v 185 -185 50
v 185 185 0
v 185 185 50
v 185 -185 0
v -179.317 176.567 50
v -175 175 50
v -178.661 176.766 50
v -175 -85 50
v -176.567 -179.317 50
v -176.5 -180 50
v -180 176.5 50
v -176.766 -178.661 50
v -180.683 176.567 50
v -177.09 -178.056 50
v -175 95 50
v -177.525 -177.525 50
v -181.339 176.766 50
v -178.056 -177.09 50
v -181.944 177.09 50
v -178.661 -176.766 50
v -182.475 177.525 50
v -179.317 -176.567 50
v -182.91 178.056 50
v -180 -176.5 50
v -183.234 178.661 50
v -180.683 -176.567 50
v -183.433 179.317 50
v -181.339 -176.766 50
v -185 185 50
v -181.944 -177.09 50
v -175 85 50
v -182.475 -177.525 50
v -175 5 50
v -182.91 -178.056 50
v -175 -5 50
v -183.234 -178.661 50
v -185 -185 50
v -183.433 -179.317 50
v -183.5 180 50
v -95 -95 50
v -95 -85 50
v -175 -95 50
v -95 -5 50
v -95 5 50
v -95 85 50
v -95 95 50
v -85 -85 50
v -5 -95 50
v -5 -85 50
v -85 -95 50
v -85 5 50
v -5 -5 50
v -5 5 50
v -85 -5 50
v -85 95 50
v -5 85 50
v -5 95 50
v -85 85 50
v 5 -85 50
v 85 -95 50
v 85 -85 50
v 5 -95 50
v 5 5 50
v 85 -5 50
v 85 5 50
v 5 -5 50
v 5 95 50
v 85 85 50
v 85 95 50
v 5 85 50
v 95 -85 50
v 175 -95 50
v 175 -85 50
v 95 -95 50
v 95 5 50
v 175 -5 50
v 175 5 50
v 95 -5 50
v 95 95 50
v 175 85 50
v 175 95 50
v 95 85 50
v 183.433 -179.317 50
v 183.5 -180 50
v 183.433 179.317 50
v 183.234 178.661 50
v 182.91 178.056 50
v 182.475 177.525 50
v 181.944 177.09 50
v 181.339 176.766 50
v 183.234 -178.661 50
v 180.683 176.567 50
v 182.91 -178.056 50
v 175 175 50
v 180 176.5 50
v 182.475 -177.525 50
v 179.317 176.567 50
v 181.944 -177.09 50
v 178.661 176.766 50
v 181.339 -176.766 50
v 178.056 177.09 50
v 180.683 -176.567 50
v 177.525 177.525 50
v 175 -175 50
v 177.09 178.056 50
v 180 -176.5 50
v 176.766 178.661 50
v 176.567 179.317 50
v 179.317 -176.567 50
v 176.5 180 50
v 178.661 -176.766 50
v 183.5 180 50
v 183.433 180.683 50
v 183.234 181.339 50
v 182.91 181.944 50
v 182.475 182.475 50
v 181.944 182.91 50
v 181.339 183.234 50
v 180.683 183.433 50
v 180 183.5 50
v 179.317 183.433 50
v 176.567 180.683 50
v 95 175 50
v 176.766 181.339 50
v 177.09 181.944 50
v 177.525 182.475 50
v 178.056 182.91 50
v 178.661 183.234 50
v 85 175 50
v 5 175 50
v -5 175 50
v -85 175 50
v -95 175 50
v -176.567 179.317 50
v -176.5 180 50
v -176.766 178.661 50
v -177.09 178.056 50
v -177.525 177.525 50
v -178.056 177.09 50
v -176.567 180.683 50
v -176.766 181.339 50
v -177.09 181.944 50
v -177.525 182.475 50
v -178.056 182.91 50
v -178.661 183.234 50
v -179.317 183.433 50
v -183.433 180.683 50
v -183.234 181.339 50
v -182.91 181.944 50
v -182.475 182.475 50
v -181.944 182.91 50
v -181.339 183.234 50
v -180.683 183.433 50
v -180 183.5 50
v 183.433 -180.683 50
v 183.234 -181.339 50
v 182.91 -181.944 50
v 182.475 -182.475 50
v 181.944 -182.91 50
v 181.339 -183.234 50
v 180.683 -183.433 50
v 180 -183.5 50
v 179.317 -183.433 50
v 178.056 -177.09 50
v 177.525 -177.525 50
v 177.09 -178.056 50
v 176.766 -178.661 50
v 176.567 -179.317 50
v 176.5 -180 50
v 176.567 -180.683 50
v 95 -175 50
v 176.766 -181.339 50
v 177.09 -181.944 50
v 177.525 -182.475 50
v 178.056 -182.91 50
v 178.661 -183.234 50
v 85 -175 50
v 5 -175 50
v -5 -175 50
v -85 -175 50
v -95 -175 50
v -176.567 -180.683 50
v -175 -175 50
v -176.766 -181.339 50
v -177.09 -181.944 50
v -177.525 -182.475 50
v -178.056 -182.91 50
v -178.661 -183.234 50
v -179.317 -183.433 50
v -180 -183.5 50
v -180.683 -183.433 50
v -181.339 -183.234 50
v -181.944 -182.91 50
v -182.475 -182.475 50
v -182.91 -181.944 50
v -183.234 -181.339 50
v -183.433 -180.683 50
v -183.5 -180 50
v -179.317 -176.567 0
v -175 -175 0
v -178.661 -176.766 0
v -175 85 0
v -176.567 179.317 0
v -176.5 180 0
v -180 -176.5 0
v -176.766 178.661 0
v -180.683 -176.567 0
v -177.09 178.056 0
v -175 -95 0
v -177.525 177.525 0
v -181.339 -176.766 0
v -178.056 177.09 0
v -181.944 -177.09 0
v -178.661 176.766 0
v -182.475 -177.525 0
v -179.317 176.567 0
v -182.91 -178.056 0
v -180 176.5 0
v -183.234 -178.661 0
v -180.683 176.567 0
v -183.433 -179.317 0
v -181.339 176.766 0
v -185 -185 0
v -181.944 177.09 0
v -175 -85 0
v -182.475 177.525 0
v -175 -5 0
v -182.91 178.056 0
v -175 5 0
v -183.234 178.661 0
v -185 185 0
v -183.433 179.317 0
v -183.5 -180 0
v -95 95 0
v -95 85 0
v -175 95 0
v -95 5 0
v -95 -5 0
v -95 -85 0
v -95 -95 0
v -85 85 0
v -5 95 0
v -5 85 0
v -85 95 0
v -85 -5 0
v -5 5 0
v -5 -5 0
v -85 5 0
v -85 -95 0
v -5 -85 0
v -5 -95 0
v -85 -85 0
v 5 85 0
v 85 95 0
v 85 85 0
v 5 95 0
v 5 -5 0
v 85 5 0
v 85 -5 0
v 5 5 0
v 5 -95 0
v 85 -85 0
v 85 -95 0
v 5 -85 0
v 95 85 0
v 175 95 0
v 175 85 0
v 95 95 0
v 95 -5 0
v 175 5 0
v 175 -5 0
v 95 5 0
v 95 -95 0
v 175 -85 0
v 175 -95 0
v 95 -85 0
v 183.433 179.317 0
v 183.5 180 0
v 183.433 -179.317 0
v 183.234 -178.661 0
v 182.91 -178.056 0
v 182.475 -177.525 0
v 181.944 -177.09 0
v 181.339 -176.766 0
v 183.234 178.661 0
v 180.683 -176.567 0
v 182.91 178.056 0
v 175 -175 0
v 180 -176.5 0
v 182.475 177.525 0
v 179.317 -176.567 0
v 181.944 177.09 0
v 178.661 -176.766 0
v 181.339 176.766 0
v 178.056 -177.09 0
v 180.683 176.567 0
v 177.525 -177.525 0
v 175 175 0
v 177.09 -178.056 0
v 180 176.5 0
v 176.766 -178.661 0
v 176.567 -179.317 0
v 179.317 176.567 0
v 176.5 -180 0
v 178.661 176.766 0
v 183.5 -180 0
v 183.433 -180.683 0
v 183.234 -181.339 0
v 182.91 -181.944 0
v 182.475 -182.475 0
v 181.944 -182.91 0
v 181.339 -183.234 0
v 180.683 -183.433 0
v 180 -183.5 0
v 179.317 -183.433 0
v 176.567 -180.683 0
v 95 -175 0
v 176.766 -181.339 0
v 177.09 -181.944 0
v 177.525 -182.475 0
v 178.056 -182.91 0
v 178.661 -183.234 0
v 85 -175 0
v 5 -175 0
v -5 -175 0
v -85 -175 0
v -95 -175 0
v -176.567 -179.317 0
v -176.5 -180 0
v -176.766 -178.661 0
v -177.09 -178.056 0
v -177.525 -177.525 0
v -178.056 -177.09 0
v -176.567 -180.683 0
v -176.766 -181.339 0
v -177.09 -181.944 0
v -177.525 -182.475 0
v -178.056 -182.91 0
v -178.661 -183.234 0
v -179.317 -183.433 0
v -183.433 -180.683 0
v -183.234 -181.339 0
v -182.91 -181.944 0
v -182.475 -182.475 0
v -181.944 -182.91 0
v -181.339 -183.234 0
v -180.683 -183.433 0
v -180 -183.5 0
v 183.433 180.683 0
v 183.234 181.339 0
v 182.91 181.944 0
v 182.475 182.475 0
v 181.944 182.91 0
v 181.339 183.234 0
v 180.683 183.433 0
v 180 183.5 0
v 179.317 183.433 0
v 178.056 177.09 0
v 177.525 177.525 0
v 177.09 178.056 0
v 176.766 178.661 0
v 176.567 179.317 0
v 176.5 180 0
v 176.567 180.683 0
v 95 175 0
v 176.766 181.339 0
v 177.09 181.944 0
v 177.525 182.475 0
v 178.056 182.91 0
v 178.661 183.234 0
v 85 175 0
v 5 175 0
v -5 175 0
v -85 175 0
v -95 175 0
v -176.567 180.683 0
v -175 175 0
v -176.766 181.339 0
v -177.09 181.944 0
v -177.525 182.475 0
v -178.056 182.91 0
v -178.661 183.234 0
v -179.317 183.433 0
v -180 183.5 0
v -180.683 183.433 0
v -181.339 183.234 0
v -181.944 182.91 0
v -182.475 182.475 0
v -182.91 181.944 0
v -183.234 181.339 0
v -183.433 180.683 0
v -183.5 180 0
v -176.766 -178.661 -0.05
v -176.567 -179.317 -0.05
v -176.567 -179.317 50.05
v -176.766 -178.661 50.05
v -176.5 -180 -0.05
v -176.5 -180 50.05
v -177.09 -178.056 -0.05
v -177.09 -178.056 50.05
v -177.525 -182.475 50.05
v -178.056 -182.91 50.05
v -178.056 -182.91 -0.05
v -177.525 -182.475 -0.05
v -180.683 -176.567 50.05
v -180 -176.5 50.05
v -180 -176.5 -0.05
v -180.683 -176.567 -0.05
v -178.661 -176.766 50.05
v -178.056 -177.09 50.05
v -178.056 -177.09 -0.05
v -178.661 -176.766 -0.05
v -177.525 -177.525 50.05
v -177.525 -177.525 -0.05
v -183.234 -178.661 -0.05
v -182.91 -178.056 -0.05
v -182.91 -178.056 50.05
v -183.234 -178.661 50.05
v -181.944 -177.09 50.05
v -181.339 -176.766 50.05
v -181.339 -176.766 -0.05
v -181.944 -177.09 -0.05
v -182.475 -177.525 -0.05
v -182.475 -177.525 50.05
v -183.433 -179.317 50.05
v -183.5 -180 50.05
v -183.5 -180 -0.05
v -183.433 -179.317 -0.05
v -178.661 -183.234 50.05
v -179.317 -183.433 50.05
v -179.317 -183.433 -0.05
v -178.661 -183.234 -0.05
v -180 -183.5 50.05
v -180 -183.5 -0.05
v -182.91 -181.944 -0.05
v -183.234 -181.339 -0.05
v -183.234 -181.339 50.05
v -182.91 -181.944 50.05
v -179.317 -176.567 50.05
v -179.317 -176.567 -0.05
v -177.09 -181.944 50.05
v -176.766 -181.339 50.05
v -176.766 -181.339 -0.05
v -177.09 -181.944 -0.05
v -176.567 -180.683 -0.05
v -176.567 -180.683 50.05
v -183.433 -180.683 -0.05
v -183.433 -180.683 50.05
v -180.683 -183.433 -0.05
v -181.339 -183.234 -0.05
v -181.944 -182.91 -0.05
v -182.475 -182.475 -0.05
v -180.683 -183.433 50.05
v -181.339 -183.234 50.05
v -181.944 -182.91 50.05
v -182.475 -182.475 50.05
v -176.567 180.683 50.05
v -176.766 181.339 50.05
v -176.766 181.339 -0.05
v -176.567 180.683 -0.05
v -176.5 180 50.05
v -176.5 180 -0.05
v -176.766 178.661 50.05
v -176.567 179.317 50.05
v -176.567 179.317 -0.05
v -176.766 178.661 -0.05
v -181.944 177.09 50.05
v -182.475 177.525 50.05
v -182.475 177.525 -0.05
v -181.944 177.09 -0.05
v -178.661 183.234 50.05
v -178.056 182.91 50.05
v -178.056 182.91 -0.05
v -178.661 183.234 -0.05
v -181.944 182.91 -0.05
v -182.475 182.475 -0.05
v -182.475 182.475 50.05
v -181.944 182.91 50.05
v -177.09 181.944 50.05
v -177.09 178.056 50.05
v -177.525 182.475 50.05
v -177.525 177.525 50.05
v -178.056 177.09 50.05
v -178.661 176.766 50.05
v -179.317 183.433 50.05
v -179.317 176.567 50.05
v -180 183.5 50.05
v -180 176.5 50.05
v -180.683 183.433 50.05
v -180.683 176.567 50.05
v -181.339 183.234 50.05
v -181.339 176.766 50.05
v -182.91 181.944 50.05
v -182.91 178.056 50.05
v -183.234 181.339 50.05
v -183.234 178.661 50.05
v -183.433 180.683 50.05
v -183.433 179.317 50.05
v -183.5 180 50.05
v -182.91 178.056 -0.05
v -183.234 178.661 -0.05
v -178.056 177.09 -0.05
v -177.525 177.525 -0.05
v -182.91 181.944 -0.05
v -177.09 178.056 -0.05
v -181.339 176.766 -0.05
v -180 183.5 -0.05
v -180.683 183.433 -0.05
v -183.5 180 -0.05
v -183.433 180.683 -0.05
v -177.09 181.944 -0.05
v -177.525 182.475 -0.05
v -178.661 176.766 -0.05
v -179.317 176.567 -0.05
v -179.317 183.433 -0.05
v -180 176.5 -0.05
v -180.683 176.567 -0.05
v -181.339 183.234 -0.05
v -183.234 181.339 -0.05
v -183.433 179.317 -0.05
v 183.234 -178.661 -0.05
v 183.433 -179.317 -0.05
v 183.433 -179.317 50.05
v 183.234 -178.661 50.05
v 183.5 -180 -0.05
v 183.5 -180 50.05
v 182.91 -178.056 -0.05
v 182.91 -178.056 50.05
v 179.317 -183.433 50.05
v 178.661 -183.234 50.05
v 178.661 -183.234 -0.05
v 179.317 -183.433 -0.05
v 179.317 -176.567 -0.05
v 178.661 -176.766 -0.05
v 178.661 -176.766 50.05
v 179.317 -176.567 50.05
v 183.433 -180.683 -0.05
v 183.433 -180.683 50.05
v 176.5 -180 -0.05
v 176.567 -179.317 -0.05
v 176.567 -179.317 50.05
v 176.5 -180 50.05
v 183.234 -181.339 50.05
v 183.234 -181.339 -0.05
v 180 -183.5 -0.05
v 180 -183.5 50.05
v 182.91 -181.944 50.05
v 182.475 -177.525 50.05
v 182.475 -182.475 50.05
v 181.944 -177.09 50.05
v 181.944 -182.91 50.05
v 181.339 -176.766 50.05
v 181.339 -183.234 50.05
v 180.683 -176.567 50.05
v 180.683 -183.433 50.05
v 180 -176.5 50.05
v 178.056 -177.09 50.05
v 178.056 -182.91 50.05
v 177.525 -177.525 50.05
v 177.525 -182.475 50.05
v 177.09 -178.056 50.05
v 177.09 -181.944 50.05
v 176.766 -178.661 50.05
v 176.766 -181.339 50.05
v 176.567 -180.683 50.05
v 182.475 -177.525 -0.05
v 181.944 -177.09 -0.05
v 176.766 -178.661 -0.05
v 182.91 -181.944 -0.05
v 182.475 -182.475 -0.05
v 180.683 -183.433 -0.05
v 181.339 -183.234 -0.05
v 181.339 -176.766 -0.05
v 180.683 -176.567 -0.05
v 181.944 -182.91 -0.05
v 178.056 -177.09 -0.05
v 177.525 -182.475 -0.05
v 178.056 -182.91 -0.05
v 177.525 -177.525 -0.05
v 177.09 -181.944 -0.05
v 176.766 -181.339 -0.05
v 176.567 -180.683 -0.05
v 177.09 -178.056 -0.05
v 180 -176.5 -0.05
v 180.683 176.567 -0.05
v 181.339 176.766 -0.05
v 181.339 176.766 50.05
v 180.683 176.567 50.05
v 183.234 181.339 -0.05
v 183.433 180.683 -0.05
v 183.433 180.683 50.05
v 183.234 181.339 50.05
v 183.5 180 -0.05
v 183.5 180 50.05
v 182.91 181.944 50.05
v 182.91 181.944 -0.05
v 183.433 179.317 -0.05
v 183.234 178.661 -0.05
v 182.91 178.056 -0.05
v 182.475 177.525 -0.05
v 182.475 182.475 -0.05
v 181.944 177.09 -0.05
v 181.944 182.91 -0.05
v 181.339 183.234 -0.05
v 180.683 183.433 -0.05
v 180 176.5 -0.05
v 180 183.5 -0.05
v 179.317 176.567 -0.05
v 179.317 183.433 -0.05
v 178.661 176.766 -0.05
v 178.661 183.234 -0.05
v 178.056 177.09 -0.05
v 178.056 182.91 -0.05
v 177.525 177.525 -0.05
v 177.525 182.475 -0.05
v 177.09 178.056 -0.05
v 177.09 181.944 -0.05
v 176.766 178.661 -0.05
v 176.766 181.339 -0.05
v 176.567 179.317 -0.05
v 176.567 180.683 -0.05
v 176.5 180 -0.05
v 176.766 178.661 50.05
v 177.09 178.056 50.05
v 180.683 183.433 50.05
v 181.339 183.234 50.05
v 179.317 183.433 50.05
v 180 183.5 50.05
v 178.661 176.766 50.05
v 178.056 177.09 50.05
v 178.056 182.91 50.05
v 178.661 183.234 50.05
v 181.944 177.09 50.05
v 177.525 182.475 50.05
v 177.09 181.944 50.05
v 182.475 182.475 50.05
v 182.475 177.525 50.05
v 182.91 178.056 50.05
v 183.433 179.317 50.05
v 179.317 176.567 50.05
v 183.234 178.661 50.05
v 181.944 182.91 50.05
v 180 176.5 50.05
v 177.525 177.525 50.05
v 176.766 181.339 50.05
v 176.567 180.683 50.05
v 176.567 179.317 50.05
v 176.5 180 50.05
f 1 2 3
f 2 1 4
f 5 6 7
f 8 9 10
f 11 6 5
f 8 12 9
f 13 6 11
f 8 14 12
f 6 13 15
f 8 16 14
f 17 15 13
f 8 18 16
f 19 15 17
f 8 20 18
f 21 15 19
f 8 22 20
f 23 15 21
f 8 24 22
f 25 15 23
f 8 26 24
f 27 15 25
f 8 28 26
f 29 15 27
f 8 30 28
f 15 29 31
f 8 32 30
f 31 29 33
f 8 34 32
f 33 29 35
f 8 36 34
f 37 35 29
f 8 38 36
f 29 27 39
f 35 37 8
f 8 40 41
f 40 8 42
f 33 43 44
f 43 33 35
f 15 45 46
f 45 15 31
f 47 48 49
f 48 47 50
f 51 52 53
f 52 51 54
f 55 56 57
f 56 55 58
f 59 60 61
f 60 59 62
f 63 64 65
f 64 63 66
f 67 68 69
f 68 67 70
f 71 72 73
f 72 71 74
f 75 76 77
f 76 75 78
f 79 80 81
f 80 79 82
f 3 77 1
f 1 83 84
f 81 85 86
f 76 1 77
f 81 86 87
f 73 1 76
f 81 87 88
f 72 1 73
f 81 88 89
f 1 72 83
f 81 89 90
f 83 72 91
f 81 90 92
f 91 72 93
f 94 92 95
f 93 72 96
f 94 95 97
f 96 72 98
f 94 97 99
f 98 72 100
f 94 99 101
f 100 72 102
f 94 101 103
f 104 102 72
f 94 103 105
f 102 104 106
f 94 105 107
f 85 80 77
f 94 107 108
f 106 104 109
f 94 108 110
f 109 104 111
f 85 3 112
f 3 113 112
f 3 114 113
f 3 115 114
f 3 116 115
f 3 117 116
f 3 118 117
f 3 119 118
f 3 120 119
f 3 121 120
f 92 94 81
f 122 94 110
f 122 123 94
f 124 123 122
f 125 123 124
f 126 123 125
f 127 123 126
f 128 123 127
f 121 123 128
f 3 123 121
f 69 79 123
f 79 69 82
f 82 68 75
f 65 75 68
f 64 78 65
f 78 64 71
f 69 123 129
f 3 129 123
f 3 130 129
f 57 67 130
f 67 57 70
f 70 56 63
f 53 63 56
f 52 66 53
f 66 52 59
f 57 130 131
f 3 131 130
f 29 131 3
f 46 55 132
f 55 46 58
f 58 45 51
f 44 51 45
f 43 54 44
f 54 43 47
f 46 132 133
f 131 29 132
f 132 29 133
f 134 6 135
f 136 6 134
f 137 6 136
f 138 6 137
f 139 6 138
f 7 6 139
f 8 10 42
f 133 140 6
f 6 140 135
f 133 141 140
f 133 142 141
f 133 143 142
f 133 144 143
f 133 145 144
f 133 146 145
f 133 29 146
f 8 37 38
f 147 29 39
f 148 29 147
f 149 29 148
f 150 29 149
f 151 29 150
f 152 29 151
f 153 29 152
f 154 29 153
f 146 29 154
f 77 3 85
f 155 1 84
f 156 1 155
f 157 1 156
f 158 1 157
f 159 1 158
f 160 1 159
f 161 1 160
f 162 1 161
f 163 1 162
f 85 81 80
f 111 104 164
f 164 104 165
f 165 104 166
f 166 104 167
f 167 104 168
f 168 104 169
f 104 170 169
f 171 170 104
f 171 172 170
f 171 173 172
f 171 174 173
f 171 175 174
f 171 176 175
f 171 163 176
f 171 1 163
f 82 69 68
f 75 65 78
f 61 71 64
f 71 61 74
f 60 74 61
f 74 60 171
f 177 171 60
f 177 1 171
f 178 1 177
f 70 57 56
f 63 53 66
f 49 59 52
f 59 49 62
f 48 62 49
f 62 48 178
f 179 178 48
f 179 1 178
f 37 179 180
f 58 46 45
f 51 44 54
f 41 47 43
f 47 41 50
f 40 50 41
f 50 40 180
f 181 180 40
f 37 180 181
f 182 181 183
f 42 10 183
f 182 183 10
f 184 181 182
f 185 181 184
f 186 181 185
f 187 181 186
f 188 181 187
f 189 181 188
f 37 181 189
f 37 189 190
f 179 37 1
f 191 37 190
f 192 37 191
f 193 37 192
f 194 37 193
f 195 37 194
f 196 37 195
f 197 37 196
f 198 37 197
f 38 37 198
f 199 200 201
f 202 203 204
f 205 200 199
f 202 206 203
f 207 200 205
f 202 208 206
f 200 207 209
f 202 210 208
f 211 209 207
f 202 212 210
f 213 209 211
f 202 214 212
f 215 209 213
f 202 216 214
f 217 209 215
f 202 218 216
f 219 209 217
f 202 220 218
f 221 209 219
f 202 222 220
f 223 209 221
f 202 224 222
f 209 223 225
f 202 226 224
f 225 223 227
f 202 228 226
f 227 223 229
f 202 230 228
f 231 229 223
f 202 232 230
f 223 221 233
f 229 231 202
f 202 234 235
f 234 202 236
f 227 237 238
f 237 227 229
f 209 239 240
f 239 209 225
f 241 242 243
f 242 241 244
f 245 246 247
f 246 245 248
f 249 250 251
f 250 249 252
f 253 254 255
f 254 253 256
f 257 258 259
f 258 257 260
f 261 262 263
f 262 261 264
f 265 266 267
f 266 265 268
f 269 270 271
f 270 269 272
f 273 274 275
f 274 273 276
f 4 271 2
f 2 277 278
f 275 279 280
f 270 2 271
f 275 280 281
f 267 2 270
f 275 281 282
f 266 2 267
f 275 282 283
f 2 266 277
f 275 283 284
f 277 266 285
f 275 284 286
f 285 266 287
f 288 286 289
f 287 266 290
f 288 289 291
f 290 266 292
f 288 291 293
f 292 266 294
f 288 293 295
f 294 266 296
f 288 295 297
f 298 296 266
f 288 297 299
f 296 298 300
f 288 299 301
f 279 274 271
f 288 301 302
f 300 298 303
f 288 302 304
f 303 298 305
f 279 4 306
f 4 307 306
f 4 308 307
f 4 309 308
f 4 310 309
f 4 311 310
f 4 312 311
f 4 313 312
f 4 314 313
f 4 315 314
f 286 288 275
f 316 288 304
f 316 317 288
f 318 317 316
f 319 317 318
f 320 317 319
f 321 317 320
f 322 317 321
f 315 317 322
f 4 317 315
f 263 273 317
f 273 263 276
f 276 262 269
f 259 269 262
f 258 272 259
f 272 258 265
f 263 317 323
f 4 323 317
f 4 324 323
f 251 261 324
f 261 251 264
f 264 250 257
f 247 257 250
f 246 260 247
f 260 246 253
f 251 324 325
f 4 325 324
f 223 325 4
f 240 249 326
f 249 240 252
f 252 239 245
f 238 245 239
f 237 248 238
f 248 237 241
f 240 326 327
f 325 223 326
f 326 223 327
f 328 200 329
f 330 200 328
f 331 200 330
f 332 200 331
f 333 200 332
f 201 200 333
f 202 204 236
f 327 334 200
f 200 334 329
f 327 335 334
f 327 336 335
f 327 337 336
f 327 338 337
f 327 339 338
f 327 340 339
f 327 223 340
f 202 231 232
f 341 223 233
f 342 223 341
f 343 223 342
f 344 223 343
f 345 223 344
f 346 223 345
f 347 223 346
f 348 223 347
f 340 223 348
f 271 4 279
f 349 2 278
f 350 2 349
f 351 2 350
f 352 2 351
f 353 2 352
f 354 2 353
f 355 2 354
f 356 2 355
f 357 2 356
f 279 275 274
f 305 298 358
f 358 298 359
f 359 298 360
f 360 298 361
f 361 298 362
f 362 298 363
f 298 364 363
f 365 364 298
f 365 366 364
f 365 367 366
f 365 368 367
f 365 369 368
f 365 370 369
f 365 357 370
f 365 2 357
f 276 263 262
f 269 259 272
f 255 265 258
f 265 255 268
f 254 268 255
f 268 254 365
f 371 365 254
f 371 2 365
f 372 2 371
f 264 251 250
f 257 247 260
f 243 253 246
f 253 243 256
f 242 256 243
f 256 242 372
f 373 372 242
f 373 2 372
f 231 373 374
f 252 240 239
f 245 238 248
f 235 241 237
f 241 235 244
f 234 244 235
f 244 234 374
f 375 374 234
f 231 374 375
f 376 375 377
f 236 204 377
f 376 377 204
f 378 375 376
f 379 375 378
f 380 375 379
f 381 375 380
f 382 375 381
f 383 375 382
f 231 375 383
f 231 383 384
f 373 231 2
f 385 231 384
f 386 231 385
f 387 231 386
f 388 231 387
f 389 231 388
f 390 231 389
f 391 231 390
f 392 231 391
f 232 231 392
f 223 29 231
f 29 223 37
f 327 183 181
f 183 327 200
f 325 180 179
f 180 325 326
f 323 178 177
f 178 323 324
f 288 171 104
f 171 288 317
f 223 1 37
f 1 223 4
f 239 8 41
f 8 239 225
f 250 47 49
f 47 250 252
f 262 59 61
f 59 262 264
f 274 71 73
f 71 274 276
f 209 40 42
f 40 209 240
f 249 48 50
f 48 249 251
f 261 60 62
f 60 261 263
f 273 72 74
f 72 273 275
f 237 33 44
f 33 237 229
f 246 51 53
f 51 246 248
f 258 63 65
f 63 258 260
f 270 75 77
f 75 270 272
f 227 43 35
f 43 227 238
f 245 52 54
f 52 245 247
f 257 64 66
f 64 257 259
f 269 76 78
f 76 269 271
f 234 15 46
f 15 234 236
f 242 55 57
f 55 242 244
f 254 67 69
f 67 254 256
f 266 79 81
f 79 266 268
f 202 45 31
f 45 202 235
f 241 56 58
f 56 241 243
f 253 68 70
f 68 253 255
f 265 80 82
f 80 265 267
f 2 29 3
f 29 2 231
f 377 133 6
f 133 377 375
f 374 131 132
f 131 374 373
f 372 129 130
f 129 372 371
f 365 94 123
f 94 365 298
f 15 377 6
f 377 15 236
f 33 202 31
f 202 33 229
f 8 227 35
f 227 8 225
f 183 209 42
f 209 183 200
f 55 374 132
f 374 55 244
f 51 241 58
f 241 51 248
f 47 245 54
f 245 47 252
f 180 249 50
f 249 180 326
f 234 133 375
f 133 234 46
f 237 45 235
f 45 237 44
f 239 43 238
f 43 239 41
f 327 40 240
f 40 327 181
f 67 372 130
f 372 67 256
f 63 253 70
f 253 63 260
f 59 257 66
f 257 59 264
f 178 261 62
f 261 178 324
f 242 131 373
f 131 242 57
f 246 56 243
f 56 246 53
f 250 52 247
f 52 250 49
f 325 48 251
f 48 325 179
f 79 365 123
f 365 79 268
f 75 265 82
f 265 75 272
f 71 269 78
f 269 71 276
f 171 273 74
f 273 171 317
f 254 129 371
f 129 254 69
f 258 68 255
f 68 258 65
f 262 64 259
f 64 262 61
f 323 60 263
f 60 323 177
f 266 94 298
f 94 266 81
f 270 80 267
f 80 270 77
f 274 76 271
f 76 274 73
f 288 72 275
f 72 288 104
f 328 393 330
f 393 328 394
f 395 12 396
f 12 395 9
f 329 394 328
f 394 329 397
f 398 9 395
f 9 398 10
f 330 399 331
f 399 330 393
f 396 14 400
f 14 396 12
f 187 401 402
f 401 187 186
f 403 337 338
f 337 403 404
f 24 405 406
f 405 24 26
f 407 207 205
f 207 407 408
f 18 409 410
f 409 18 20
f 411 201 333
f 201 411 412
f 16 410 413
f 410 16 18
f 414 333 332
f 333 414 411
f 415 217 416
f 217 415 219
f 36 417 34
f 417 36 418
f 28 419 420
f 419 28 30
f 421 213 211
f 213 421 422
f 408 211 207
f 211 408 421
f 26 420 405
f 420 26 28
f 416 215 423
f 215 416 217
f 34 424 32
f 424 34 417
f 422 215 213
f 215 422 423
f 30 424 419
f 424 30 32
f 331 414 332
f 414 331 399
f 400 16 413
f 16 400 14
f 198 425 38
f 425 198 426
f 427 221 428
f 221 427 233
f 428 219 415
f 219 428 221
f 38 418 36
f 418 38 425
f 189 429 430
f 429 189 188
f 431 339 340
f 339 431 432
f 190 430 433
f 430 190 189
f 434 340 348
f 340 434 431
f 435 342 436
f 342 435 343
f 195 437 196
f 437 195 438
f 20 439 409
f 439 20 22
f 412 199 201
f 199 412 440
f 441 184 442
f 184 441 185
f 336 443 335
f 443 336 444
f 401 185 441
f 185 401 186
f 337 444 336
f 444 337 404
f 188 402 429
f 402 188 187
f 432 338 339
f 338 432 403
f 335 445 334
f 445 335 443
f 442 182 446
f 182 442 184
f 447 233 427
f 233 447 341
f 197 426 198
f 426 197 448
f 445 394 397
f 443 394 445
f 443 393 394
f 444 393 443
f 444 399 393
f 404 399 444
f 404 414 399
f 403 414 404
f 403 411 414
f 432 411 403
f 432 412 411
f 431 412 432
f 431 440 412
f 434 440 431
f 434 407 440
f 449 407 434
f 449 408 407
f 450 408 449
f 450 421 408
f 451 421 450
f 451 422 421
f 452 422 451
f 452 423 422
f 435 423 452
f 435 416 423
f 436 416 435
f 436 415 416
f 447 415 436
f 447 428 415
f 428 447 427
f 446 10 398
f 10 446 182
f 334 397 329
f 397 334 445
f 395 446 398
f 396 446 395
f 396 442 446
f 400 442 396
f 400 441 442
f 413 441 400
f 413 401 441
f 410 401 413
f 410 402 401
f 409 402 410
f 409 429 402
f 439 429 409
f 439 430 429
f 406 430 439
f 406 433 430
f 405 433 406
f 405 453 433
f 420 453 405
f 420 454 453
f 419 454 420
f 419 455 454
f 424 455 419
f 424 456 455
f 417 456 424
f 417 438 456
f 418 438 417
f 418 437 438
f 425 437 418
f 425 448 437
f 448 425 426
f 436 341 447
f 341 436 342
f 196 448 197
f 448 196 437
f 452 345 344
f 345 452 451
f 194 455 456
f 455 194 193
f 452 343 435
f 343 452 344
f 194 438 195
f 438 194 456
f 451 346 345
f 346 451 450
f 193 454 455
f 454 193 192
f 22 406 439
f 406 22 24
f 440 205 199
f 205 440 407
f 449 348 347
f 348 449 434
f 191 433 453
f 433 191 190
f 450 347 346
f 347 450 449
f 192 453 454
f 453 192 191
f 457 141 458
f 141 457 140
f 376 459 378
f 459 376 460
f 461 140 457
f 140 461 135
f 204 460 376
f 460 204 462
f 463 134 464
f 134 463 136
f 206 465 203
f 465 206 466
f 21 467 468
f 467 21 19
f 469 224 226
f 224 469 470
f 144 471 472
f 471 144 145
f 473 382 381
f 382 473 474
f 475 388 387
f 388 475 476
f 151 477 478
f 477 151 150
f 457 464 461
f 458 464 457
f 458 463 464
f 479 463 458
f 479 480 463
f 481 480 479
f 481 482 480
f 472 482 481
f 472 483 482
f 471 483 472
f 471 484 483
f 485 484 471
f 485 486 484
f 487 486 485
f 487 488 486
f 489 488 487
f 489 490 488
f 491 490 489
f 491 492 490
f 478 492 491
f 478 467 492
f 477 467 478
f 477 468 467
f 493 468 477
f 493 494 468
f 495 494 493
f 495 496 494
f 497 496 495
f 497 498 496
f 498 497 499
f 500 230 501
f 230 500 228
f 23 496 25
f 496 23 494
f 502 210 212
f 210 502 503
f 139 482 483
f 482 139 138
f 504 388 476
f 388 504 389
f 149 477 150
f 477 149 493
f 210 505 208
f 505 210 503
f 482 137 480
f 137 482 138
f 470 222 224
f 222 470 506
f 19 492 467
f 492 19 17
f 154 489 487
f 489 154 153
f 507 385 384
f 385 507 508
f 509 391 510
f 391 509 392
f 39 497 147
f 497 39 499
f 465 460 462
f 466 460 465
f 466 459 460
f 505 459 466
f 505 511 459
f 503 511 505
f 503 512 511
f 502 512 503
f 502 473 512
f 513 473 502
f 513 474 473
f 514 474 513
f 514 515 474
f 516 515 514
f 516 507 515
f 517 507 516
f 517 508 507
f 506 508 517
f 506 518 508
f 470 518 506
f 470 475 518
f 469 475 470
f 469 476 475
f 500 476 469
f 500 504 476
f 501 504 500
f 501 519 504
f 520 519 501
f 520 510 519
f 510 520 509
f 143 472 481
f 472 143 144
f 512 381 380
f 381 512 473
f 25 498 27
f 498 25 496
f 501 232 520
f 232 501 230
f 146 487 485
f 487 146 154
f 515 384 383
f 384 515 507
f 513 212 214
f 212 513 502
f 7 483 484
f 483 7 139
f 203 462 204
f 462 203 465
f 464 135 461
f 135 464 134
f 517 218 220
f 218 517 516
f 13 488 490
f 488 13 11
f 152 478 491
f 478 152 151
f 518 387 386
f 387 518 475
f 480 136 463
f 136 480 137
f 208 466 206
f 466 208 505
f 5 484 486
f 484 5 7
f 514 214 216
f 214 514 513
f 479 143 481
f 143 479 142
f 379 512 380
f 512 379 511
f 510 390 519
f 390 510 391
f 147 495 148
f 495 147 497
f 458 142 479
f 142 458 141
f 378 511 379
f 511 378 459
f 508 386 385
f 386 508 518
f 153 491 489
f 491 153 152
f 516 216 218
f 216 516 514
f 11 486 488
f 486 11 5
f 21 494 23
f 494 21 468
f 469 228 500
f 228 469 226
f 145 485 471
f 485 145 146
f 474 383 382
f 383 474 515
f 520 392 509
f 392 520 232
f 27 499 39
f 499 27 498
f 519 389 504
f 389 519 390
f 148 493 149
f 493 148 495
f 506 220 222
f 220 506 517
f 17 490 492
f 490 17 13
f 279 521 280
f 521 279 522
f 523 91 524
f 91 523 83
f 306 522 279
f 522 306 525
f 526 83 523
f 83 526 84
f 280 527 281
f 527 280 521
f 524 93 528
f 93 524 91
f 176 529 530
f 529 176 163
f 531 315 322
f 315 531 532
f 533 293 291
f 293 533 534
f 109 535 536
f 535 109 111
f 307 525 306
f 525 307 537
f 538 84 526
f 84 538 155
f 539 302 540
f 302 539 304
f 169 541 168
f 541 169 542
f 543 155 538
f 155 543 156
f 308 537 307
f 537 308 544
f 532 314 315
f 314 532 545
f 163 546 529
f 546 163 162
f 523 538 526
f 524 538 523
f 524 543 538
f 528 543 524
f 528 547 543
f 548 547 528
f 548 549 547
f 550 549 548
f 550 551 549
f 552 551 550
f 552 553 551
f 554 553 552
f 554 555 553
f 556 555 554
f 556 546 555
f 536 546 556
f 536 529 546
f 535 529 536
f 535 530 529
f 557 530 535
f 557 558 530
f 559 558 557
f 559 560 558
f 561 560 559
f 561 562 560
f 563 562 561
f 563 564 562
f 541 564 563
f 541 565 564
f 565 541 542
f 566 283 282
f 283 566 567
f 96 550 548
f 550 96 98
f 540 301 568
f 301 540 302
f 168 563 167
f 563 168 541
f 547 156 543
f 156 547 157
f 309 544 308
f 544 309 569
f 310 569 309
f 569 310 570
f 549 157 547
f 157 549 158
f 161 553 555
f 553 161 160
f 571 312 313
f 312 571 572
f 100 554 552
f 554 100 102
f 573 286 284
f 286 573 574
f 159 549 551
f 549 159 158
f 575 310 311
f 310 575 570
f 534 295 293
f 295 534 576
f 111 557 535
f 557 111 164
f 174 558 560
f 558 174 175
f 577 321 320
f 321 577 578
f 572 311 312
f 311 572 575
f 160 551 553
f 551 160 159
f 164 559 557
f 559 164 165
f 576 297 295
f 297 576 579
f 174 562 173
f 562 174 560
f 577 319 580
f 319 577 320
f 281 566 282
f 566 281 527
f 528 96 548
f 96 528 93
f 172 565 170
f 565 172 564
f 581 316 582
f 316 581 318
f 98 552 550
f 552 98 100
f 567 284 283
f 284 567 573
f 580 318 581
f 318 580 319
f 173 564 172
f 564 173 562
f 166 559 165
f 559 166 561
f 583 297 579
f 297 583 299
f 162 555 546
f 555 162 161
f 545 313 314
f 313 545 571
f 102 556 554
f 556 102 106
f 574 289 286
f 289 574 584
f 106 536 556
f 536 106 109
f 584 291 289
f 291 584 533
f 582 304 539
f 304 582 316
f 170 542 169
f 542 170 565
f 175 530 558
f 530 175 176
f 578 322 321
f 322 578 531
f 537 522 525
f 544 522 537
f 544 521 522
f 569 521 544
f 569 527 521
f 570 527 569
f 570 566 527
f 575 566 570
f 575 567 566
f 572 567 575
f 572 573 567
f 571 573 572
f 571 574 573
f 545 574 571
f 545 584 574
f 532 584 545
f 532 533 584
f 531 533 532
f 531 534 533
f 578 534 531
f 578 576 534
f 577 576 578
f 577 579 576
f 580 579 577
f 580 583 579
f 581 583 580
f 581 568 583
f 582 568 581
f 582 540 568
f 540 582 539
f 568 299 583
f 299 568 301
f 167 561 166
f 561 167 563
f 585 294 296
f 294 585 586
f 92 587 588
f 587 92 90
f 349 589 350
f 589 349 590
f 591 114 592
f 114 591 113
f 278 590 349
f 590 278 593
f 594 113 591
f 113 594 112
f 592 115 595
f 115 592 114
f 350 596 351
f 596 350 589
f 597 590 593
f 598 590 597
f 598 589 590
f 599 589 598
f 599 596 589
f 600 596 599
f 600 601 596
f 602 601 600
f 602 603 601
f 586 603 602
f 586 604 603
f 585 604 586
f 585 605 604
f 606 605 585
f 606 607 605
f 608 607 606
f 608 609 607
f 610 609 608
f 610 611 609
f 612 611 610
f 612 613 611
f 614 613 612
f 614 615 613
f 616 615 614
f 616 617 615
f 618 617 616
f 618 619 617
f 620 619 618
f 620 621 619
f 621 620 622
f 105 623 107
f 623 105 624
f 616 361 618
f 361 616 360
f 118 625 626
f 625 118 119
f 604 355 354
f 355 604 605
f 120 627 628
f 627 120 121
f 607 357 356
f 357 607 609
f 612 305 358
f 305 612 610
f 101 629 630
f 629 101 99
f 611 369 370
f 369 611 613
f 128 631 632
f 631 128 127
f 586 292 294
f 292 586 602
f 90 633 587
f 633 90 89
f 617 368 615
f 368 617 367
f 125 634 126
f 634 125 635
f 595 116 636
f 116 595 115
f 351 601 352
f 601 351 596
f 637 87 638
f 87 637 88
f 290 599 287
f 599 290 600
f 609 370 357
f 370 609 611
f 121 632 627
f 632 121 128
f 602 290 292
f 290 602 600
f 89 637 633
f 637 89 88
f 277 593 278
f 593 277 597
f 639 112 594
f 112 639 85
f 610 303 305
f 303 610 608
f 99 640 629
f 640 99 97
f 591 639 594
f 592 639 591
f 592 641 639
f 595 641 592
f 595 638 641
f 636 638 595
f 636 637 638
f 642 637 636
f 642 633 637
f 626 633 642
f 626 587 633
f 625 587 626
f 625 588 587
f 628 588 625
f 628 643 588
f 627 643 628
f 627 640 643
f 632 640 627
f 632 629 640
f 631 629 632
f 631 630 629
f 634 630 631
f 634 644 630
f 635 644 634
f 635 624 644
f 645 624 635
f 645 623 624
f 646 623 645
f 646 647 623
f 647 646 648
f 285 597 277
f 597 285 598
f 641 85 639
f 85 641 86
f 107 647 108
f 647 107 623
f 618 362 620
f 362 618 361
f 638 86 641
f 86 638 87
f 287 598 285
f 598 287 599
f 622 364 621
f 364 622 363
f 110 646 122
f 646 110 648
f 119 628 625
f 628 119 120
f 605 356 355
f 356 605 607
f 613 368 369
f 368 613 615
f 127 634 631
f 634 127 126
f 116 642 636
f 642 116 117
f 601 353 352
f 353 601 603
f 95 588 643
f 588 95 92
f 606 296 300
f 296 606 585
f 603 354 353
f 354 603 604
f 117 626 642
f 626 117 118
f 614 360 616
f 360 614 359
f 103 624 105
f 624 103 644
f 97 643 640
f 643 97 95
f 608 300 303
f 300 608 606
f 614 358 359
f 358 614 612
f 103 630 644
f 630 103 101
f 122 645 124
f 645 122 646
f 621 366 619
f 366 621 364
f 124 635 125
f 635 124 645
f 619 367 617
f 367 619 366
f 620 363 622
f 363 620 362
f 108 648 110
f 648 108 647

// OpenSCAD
// Part Name: Cage_Layer_8_H50mm
// This part represents a horizontal slice of the cage.
// It is designed to be 3D printed on its base.

// Parameters for the cage
bar_t = 10;
gap_xy = 80;
hole_d = 7;
cage_ext_xy = 370;

// Calculate bar center positions relative to the overall cage center
bar_centers_xy = [for (j = [0:4]) (-cage_ext_xy/2 + bar_t/2 + j * (bar_t + gap_xy))];

// Module to generate a single layer segment
module cage_layer_segment(height) {
    // Offset for printing on z=0 plane. The module itself is centered on XY=0, so this Z offset moves its base to Z=0.
    translate([0, 0, height/2]) {
        union() {
            // Horizontal bars (along X)
            for (y_center = bar_centers_xy) {
                translate([0, y_center, 0])
                cube([cage_ext_xy, bar_t, height], center = true);
            }

            // Vertical bars (along Y)
            for (x_center = bar_centers_xy) {
                translate([x_center, 0, 0])
                cube([bar_t, cage_ext_xy, height], center = true);
            }

            // Subtract holes for M6 rods at the 4 corners
            corner_offsets_xy = [bar_centers_xy[0], bar_centers_xy[4]];

            for (x_offset = corner_offsets_xy) {
                for (y_offset = corner_offsets_xy) {
                    // Hole through the center of the corner bar
                    translate([x_offset, y_offset, 0])
                    cylinder(h = height + 0.1, d = hole_d, center = true, $fn=32); // +0.1 for clean cut
                }
            }
        }
    }
}

// Render the segment
cage_layer_segment(50);
